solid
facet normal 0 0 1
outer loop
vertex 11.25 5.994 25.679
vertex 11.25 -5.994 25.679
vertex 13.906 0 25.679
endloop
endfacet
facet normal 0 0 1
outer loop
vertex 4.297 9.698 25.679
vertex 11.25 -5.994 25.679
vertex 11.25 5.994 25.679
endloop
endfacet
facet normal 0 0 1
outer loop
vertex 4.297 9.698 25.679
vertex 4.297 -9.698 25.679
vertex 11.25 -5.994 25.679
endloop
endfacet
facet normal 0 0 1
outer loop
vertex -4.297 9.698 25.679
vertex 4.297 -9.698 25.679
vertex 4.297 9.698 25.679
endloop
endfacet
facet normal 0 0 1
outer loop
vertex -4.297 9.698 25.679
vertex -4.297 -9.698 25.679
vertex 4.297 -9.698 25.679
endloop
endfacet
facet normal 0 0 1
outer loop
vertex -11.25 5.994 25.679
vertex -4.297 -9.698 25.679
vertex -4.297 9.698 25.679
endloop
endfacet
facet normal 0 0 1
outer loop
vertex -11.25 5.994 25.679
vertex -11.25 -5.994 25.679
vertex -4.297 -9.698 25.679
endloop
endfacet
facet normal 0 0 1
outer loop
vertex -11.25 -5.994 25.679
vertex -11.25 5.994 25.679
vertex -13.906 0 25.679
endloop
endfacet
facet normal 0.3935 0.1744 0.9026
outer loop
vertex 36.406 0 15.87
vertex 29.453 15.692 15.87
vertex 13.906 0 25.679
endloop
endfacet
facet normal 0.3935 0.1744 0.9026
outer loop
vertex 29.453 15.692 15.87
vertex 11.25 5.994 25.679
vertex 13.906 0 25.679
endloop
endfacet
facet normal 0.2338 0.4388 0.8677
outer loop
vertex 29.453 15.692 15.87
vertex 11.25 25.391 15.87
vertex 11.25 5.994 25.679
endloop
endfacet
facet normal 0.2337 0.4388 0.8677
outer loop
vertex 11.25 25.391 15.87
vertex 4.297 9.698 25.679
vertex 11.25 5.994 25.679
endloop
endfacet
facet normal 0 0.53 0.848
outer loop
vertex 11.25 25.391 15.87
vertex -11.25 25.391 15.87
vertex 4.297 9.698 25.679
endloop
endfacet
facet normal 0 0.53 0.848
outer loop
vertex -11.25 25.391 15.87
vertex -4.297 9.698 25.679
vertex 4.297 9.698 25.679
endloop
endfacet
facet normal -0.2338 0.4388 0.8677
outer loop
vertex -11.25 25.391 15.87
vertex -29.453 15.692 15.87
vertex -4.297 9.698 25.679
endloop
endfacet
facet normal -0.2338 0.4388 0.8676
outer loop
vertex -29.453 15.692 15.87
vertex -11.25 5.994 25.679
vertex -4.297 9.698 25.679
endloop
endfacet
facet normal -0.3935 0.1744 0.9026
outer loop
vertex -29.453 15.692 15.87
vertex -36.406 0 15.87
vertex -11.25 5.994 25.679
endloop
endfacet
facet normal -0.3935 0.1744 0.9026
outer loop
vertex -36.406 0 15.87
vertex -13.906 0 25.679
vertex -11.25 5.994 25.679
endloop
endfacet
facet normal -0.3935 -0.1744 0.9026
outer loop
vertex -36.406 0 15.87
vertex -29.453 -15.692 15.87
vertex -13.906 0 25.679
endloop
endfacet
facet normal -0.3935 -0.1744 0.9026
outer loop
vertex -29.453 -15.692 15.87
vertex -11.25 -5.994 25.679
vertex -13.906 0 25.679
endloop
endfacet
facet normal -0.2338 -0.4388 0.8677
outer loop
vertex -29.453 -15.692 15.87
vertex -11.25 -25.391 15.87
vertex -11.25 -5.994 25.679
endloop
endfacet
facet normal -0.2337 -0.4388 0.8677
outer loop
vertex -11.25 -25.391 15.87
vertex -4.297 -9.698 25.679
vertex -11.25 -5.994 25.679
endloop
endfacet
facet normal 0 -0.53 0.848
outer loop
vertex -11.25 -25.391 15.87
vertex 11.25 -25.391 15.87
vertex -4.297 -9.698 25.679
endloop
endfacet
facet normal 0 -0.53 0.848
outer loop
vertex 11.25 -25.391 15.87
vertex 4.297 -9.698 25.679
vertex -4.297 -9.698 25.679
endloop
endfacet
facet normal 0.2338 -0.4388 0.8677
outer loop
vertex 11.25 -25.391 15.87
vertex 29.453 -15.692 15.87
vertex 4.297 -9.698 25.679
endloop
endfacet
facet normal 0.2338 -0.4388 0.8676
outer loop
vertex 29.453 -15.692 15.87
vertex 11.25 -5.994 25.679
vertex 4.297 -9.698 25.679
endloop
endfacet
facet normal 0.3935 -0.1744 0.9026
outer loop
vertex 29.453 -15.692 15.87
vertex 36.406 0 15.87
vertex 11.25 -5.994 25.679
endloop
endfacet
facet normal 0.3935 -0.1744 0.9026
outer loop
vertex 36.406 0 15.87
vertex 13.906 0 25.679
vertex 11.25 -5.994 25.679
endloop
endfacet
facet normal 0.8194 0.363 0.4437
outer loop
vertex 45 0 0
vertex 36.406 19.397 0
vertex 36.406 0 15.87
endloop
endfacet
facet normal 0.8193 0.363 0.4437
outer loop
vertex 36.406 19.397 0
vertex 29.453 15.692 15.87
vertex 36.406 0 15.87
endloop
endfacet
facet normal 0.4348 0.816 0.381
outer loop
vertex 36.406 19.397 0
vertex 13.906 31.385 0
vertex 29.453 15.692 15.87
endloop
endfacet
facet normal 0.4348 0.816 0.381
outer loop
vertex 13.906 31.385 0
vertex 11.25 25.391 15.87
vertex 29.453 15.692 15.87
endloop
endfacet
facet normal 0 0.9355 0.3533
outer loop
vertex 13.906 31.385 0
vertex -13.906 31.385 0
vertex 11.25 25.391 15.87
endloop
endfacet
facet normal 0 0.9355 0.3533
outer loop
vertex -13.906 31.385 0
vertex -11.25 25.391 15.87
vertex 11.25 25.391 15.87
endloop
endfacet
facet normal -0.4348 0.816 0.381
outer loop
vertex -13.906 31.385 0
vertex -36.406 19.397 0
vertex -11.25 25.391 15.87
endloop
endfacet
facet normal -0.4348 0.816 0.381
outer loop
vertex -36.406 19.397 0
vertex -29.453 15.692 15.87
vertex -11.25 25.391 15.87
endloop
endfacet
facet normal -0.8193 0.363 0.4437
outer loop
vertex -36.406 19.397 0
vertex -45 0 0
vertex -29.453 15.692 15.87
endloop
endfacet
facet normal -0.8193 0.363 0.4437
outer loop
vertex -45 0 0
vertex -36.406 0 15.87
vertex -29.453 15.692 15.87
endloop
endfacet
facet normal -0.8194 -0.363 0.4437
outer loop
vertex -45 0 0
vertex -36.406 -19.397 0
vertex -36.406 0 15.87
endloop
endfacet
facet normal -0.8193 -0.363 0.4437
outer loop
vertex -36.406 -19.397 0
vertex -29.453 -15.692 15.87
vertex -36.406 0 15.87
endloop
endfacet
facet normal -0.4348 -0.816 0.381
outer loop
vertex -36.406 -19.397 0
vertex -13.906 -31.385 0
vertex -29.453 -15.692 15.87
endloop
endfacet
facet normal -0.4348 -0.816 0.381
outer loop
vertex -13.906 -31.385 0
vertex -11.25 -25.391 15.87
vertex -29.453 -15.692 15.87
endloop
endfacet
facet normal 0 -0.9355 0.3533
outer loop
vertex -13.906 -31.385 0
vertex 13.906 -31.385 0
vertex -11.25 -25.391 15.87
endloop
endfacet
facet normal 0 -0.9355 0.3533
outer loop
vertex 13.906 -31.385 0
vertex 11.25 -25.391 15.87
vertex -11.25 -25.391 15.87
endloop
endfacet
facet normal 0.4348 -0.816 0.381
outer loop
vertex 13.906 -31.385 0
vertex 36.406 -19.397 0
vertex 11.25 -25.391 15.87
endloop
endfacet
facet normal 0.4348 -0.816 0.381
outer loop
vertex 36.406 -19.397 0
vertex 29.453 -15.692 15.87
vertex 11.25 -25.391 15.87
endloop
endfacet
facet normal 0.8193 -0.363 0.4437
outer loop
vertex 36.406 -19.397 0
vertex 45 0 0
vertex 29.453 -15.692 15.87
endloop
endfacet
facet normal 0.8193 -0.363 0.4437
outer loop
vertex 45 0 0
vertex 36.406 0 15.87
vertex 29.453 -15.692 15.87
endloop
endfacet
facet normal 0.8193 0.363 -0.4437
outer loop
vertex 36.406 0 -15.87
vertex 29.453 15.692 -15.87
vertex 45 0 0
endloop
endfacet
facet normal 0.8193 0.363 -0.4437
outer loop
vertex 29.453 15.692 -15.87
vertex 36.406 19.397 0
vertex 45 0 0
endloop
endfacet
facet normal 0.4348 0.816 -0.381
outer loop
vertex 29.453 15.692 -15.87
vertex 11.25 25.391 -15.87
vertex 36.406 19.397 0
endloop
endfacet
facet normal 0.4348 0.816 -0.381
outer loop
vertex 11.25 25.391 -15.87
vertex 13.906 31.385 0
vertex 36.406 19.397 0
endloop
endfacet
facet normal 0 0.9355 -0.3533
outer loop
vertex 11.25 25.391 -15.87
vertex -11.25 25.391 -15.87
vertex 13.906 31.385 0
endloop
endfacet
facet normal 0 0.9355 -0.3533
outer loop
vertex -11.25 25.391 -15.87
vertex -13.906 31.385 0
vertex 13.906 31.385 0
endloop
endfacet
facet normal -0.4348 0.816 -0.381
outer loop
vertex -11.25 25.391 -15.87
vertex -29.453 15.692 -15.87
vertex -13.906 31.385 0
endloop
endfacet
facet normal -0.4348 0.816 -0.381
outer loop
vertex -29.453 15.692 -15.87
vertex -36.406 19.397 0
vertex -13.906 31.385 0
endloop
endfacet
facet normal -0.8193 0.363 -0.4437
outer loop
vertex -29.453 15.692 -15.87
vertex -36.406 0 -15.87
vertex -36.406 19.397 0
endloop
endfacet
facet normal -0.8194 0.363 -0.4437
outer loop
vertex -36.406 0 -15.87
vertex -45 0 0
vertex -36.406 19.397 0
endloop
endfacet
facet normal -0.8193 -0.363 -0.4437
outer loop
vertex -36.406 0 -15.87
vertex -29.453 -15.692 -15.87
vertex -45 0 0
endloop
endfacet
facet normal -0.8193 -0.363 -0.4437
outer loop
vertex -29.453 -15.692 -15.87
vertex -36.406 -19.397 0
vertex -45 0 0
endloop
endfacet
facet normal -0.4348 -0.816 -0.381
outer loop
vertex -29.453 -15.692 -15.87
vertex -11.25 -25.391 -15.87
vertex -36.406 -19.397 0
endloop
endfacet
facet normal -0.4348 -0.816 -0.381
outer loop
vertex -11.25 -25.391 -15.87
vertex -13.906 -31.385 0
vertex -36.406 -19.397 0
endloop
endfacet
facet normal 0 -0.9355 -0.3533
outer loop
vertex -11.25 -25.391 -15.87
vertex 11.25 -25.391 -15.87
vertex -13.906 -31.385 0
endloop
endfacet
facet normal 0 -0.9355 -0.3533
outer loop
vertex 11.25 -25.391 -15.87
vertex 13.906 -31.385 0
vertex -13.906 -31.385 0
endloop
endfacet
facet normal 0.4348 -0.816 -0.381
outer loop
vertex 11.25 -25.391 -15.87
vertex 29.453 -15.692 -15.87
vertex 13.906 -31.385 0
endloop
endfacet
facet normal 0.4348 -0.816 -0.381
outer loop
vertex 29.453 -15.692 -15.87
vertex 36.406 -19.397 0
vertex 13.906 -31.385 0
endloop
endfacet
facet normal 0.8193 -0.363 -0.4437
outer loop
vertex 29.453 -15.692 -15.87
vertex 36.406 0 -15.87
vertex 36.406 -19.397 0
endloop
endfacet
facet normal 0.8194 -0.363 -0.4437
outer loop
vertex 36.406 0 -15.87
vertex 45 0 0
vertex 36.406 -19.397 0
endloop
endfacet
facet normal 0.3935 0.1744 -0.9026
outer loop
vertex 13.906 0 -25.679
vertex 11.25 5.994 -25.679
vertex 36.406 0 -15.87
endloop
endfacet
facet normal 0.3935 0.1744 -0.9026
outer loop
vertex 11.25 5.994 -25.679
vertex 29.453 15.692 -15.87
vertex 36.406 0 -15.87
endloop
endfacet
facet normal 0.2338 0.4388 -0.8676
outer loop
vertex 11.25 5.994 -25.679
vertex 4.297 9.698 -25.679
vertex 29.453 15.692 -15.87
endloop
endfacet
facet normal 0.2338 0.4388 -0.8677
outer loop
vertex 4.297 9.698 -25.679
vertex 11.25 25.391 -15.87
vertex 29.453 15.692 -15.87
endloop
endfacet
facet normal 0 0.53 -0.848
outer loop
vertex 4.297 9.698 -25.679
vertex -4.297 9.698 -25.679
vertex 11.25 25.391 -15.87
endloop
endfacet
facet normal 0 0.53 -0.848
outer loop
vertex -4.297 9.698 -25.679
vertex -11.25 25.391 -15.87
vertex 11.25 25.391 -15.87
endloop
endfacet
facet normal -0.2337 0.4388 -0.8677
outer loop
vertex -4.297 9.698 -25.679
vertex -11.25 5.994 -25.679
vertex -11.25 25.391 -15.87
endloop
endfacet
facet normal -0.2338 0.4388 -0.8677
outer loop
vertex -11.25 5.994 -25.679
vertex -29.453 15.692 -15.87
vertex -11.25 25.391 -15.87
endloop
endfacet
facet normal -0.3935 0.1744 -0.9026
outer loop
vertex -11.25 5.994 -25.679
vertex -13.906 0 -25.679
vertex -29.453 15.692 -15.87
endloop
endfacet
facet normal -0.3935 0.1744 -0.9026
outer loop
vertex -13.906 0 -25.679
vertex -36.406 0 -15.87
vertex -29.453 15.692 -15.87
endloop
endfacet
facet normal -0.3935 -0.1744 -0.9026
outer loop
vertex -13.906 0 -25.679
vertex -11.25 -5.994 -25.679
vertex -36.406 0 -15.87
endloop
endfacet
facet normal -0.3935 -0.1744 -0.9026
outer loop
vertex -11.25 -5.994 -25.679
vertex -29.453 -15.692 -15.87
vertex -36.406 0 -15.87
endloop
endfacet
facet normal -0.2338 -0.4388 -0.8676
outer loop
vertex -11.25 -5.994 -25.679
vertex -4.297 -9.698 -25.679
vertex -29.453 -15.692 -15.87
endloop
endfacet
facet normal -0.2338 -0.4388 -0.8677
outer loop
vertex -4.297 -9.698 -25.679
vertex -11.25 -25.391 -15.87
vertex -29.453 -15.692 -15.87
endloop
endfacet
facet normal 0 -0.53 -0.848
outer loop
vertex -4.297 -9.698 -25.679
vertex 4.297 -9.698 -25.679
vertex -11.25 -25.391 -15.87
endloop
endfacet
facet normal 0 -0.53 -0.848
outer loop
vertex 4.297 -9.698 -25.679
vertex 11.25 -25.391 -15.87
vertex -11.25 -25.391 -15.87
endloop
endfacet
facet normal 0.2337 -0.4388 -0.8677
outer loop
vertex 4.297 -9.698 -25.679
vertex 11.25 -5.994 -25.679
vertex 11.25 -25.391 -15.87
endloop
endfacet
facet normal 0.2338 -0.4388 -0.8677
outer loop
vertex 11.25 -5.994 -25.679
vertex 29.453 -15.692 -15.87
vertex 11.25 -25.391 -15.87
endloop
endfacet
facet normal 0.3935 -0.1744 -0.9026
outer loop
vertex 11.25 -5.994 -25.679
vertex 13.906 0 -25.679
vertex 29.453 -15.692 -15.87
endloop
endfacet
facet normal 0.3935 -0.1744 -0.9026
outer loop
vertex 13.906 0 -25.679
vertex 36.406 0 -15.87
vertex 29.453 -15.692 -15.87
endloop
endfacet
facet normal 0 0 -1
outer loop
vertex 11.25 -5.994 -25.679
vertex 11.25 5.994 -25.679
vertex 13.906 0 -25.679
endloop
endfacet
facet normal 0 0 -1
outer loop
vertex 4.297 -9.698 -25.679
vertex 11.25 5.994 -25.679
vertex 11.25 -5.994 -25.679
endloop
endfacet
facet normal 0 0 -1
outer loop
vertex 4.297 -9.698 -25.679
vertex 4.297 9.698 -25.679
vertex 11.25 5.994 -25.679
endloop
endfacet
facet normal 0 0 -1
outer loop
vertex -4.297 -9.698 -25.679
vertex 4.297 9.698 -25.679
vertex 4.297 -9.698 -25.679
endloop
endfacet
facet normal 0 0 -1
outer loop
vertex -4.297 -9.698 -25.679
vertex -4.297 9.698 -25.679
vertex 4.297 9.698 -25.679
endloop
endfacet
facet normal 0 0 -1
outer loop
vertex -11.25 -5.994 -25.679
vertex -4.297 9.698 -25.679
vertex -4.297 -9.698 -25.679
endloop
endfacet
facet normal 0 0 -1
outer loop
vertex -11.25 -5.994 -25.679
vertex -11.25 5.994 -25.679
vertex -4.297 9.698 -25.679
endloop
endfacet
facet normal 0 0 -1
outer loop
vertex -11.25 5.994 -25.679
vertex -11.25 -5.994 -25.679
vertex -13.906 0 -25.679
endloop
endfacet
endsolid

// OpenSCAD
// Generated by SolidPython 1.0.1 on 2020-07-29 00:46:52


scale(v = [15, 11, 9]) {
	sphere(r = 3);
}
/***********************************************
*********      SolidPython code:      **********
************************************************
 
# import packages: SolidPython
from solid import *
from solid.utils import *
from itertools import chain, combinations, permutations


class Resize:

    def __init__(self, scad_file):
        self.scad_file = scad_file
        #self.scad_file = import_scad(scad_file)
        # cone/cylinder param:
        self.r1 = 0
        self.r2 = 0
        self.h = 0
        # rectangular prism param:
        self.w = 0
        self.l = 0
        # ellipse param:
        self.r = 0

    # import OpenScad code (file name corresponds to shape)


    # classify shape + parameters
    def assign(self, param1, param2, param3):
        if self.scad_file == 'cone.scad':
            self.r1 = param1
            self.r2 = param2
            self.h = param3
        elif self.scad_file == 'cylinder.scad':
            self.r1 = param1
            self.r2 = param2
            self.h = param3
        elif self.scad_file == 'rectangularPrism.scad':
            self.h = param1
            self.l = param2
            self.w = param3
        else:
            self.r = param1
            self.h = param2

    # resize parameters
    def iterate(self):
        x = range(3, 20, 2)
        i = 1
        if self.scad_file == 'cone.scad':
            tempList = list(permutations(x, 2))
            for temp in tempList:
                param1 = temp[0]
                param2 = temp[1]
                filepath = 'produced_scad_files/' + 'cone' + str(param1) + '_' + str(param2) + '_' + '.scad'
                scad_render_to_file(cylinder(h=param1, r1=param2, r2=0), filepath)

        elif self.scad_file == 'cylinder.scad':
            tempList = list(permutations(x, 3))
            for temp in tempList:
                param1 = temp[0]
                param2 = temp[1]
                filepath = 'produced_scad_files/' + 'cylinder' + str(param1) + '_' + str(param2) + '_' + '.scad'
                scad_render_to_file(cylinder(h=param1, r1=param2, r2=param2), filepath)

        elif self.scad_file == 'rectangularPrism.scad':
            tempList = list(permutations(x, 3))
            for temp in tempList:
                param1 = temp[0]
                param2 = temp[1]
                param3 = temp[2]
                filepath = 'produced_scad_files/' + 'rectangularPrism' + str(param1) + '_' + str(param2) + '_' + str(
                    param3) + '.scad'
                scad_render_to_file(cube(size=(param1, param2, param3)), filepath)

        elif self.scad_file == 'ellipse.scad':
            tempList = list(permutations(x, 4))
            for temp in tempList:
                param1 = temp[0]
                param2 = temp[1]
                param3 = temp[2]
                param4 = temp[3]
                filepath = 'produced_scad_files/' + 'ellipse' + str(param1) + '_' + str(param2) + '_' + str(param3) + '_' + str(param4) + '.scad'
                scad_render_to_file(scale([param1, param2, param3])(sphere(r=param4)), filepath)

    def render_to_scadfile(self):
        scad_render_to_file(scad, 'example.scad') 
 
************************************************/
